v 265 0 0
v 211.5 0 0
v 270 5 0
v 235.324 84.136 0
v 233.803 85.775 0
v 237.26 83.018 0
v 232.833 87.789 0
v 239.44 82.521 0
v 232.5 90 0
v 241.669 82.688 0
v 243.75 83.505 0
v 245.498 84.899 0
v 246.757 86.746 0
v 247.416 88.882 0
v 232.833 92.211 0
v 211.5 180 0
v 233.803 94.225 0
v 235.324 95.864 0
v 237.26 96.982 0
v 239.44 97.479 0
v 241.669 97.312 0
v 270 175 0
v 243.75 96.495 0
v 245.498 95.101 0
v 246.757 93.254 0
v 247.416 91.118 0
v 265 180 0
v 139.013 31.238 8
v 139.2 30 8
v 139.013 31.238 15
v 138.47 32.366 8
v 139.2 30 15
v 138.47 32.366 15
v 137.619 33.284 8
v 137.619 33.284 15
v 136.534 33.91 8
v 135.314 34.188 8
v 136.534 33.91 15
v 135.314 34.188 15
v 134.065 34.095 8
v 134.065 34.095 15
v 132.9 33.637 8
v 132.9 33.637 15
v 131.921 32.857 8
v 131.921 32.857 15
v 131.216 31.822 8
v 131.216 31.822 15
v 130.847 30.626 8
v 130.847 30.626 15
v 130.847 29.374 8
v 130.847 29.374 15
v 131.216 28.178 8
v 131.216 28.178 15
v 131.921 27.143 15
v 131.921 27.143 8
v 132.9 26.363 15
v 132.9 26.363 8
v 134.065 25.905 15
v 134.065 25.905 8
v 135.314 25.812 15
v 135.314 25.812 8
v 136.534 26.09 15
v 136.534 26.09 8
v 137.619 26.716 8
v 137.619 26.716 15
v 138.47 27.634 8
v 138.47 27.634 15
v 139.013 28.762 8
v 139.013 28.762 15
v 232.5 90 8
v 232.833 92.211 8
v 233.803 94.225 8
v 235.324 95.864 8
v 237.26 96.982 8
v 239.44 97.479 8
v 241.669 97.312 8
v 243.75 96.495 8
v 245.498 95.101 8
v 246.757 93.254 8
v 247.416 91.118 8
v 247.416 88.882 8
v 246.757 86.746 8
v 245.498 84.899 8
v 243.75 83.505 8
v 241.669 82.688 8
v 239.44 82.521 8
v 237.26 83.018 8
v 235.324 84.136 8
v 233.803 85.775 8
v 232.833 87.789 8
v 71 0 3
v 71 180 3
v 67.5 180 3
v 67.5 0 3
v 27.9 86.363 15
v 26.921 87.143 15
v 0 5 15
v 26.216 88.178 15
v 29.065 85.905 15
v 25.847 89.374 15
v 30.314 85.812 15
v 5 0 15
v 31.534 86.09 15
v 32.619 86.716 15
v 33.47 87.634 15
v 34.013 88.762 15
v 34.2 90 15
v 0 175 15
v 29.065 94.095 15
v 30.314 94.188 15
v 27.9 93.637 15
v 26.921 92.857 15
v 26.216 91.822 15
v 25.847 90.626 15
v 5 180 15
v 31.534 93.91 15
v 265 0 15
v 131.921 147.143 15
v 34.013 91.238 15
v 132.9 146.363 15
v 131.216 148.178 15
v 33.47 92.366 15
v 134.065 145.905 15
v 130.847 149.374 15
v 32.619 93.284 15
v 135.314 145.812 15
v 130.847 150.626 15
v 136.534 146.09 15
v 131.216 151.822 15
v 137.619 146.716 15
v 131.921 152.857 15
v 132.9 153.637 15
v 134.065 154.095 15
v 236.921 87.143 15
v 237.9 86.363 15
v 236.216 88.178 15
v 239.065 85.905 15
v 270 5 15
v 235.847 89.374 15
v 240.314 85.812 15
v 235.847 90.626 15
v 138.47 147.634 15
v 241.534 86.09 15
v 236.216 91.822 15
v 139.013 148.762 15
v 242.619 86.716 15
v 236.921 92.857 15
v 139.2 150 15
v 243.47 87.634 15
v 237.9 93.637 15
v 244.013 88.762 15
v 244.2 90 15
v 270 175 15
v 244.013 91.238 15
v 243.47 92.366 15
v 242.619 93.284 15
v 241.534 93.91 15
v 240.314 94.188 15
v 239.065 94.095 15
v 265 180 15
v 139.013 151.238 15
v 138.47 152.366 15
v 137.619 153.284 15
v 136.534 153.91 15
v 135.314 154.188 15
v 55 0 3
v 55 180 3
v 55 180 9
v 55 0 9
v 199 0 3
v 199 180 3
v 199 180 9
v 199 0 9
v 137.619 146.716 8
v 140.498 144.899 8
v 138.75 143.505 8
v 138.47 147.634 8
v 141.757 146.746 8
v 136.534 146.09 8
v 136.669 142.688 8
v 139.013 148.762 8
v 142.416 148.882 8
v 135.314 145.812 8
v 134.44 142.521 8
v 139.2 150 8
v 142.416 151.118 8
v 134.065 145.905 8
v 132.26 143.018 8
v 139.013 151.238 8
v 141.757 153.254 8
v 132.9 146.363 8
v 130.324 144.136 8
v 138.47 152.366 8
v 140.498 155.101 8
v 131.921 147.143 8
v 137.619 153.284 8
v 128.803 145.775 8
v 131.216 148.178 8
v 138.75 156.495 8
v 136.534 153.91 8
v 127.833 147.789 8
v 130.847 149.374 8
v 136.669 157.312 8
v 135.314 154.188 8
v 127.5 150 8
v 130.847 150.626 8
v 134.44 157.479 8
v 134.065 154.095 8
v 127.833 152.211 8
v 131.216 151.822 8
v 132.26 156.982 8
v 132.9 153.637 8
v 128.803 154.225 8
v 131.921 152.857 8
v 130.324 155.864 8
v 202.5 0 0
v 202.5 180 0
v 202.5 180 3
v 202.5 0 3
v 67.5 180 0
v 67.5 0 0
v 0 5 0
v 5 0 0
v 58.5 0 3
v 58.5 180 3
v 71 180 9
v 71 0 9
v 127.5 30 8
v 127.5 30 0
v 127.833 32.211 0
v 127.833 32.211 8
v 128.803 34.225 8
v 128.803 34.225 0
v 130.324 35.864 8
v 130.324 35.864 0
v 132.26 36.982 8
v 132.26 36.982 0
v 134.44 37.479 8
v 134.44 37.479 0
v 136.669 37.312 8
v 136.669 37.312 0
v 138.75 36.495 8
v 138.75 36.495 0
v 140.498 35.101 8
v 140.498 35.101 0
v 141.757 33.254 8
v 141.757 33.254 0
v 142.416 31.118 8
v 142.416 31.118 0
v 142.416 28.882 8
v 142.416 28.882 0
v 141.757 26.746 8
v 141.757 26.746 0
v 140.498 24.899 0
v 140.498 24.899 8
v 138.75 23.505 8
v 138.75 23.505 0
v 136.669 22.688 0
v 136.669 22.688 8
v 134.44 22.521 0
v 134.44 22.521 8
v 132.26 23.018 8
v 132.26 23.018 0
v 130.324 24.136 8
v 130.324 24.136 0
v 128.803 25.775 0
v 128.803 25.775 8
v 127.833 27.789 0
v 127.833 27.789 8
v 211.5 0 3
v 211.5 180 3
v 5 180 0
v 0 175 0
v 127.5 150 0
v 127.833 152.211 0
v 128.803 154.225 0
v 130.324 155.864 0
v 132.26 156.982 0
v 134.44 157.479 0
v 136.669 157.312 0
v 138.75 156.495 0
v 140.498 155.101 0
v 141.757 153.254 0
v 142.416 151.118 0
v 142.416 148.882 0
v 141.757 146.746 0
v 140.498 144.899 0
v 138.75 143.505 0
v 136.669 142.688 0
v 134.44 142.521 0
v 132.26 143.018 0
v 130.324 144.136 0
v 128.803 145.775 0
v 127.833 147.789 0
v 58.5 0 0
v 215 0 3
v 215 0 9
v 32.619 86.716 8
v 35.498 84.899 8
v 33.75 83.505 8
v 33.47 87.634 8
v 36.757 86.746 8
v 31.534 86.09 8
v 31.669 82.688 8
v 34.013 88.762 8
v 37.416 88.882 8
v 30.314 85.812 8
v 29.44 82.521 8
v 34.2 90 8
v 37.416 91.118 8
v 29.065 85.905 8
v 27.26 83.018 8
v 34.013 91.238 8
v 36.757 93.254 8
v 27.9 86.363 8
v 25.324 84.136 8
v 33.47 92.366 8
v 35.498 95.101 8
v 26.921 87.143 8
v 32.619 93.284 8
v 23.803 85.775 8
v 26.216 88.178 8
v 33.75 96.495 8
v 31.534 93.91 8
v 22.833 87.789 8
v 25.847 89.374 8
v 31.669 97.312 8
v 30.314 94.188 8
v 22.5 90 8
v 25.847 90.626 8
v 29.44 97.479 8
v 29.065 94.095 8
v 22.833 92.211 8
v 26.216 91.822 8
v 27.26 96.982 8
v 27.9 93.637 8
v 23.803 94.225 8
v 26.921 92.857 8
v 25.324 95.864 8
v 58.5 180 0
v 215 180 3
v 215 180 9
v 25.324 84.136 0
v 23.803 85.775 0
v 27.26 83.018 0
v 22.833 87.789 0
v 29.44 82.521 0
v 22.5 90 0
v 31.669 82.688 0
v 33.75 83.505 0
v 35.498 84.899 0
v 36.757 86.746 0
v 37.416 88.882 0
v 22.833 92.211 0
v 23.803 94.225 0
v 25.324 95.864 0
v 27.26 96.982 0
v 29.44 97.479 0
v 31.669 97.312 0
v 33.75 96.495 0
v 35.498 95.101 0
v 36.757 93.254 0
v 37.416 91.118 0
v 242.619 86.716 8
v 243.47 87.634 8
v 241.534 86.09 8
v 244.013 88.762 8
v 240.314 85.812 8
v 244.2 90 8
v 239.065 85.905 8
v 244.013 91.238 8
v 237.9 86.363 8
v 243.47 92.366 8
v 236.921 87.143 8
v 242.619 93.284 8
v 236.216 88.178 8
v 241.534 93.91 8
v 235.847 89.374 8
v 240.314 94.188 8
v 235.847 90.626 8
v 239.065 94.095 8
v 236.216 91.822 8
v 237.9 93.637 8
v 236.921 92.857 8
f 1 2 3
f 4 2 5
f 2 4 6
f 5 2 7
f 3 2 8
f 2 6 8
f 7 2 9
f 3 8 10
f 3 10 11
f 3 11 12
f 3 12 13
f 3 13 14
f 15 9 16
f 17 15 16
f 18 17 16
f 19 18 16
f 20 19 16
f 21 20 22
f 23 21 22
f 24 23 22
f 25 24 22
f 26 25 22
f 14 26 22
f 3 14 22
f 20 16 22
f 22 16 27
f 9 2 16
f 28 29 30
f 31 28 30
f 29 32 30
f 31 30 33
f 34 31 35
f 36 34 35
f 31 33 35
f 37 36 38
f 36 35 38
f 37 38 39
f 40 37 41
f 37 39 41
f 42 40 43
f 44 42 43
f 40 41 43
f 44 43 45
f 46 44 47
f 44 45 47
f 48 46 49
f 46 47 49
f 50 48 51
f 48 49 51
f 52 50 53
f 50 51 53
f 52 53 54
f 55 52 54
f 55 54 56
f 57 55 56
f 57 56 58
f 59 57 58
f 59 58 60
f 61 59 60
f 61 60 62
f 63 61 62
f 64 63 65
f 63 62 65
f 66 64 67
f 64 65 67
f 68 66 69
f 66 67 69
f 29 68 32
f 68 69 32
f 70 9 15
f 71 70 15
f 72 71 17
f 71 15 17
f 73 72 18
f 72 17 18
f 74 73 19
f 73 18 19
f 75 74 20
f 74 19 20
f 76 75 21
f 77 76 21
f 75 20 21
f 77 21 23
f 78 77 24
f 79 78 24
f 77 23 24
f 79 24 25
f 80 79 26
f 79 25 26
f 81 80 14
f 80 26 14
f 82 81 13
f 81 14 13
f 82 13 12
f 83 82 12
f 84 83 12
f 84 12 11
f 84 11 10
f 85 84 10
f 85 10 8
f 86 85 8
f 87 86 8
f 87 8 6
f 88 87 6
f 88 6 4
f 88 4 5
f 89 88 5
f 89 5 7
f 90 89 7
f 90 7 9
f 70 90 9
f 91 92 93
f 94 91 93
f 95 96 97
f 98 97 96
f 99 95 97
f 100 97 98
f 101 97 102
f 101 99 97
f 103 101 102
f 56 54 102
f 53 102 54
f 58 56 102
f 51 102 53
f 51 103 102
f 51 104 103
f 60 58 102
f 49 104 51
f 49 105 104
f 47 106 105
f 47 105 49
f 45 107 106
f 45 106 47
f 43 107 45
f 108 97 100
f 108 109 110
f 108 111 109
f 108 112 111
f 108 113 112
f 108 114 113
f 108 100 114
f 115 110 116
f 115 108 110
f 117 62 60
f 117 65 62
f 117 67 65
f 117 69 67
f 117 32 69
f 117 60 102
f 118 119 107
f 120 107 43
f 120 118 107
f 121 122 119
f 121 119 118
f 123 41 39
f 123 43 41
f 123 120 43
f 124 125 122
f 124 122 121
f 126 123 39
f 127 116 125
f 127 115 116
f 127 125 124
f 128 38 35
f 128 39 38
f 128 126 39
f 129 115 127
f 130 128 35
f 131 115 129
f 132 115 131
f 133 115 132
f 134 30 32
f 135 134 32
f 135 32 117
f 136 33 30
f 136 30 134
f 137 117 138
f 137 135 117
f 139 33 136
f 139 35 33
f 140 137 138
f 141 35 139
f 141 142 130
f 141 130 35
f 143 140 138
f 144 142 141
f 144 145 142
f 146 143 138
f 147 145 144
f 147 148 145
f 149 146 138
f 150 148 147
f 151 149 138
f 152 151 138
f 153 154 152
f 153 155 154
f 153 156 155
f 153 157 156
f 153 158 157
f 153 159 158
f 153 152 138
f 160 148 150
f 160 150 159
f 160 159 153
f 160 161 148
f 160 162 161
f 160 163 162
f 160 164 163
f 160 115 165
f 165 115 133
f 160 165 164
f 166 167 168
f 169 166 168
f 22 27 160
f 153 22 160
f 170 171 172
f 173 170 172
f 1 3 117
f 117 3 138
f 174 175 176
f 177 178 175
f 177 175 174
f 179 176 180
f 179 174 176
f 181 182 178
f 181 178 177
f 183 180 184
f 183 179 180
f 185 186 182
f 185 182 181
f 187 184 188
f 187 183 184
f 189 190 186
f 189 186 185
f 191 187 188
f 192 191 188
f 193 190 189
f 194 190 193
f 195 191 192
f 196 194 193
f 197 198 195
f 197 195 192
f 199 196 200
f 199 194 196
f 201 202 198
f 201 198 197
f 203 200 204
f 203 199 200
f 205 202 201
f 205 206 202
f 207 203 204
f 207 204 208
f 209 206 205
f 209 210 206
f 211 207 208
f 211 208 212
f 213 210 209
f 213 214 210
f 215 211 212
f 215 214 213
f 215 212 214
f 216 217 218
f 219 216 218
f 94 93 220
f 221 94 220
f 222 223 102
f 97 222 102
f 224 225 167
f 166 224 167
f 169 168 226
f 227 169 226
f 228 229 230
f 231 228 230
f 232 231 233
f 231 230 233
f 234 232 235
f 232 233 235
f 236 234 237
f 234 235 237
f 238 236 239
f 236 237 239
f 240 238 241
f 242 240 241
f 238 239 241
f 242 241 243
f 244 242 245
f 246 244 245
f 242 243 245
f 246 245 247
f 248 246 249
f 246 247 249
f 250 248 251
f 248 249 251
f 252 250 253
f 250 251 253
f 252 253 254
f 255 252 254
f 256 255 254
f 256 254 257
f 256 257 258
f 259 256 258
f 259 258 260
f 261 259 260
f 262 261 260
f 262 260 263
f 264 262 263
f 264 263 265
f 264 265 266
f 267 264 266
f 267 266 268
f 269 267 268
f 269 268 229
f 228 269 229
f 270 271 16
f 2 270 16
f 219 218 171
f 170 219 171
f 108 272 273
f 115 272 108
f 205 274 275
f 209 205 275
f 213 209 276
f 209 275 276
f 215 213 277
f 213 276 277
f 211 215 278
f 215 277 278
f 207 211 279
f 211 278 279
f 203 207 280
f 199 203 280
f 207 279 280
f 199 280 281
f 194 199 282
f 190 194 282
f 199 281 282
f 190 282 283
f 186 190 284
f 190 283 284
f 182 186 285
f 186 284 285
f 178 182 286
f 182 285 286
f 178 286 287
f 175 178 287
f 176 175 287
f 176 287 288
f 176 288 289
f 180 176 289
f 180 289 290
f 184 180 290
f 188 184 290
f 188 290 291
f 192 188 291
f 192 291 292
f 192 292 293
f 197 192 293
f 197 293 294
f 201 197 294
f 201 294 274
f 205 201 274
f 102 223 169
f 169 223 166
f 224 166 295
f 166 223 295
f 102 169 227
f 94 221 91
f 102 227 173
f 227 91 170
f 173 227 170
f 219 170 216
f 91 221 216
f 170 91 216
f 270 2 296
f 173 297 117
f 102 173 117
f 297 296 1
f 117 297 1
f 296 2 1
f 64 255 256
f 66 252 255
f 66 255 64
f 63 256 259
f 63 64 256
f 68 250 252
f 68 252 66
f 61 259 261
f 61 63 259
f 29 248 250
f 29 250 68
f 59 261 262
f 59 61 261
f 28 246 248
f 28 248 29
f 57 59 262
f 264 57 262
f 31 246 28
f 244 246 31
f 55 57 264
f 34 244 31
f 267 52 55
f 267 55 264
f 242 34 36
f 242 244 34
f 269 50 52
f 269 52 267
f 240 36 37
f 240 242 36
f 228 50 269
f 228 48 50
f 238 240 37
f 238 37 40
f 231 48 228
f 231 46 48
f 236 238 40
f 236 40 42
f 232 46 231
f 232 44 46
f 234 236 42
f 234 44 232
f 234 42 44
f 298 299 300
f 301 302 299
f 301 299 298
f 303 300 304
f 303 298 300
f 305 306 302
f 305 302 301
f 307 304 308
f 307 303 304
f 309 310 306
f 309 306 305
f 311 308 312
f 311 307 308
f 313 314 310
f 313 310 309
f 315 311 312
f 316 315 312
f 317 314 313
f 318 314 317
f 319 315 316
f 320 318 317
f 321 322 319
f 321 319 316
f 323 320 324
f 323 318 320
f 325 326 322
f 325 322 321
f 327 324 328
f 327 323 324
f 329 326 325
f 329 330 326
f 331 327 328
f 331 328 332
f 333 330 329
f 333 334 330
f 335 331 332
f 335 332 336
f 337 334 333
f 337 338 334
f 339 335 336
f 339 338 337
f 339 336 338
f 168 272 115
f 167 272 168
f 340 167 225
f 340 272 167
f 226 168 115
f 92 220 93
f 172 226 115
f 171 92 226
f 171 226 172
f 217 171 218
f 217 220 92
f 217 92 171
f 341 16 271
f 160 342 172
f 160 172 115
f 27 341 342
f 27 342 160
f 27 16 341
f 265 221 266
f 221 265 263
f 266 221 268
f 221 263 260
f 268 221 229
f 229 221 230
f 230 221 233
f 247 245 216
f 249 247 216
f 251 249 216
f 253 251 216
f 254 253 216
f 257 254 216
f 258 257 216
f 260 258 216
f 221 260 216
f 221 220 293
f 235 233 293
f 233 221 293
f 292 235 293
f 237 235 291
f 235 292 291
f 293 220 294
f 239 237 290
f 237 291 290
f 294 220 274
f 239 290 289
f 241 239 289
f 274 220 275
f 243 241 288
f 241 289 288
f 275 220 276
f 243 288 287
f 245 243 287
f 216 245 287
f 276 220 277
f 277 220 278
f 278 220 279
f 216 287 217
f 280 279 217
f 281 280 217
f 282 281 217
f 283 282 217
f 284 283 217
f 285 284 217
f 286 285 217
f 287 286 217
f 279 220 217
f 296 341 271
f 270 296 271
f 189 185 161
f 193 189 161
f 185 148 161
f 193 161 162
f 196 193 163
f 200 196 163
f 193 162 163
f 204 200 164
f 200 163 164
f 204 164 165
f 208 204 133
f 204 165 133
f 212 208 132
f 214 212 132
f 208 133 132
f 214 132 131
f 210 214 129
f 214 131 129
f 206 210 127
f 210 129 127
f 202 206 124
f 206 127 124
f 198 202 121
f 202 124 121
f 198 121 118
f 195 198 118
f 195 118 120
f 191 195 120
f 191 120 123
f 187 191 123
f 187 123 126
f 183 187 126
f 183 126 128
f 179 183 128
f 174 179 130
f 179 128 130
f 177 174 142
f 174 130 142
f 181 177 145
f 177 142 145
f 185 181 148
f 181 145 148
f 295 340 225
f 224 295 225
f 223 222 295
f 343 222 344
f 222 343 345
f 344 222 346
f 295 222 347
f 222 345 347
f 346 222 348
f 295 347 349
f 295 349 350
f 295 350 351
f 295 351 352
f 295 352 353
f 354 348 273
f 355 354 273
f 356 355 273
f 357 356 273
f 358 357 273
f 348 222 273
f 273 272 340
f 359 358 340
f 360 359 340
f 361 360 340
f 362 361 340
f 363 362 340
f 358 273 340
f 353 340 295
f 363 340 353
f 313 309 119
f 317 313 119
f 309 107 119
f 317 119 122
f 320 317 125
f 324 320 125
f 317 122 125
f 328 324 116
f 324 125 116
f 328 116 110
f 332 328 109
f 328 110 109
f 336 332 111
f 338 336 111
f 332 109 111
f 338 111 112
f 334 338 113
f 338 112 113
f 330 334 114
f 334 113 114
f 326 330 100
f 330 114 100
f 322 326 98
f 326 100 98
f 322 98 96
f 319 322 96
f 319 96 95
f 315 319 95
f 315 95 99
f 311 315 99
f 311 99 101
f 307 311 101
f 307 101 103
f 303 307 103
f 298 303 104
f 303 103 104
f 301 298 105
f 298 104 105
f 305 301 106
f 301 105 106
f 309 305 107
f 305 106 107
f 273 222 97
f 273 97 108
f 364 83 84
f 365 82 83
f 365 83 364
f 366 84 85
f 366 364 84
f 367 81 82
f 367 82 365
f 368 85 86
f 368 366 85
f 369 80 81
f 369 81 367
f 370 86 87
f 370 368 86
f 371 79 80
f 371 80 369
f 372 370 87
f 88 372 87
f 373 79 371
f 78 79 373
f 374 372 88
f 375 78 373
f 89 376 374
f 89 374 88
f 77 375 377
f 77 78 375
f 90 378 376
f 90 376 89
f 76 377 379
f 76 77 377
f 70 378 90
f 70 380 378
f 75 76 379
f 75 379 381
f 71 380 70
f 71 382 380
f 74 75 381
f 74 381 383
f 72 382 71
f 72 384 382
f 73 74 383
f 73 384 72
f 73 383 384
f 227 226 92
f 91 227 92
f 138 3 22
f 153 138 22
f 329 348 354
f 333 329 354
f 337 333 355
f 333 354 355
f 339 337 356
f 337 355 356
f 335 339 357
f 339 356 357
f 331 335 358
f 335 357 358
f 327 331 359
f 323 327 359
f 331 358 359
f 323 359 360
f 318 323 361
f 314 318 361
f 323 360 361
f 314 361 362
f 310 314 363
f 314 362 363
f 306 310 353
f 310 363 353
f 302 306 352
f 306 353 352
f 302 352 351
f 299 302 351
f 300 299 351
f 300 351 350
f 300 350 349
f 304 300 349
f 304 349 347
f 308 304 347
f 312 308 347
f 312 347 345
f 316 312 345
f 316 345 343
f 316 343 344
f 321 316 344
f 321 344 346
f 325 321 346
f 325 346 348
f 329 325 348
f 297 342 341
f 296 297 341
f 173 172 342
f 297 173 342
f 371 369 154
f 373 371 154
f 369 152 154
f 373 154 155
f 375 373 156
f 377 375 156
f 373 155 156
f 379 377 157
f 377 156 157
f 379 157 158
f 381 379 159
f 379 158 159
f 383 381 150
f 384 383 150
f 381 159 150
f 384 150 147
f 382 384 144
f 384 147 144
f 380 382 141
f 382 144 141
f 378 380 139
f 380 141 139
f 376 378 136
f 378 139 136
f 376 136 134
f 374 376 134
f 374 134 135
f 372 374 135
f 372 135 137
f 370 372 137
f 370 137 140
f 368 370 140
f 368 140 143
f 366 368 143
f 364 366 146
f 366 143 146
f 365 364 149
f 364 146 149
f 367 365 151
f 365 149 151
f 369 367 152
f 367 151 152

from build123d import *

# Parameters (mm, degrees)
SKETCH_1_W                   = 270
SKETCH_1_H                   = 180
EXTRUDE_1_DEPTH              = 15
CHAMFER_1_SIZE               = 5
HOLE_WIZARD_M8_1_D           = 8.4
HOLE_WIZARD_M8_1_CBORE_D     = 15
HOLE_WIZARD_M8_1_CBORE_DEPTH = 8
CUT_EXTRUDE_1_DEPTH          = 325.846117416


with BuildPart() as part:
    # 草图1 → 凸台-拉伸1 (new body)
    with BuildSketch(Plane.XY):
        with Locations((135, 90)):
            Rectangle(SKETCH_1_W, SKETCH_1_H)
    extrude(amount=EXTRUDE_1_DEPTH)

    # 倒角1
    chamfer_1_edges = [part.edges().sort_by_distance(p)[0] for p in [
        (0, 180, 7.5),
        (270, 180, 7.5),
        (270, 0, 7.5),
        (0, 0, 7.5),
    ]]
    chamfer(chamfer_1_edges, length=CHAMFER_1_SIZE)

    # M8 凹头盖螺钉的柱形沉头孔1 (through all)
    with Locations(Plane(origin=(0, 0, 0), x_dir=(-1, 0, 0), z_dir=(0, 0, -1))):
        with Locations((-240, 90), (-30, 90), (-135, 30), (-135, 150)):
            CounterBoreHole(HOLE_WIZARD_M8_1_D / 2, HOLE_WIZARD_M8_1_CBORE_D / 2, HOLE_WIZARD_M8_1_CBORE_DEPTH)

    # 草图4 → 切除-拉伸1 (cut, through all)
    with BuildSketch(Plane(origin=(0, 180, 0), x_dir=(1, 0, 0), z_dir=(0, 1, 0))):
        Polygon((55, -9), (71, -9), (71, -3), (67.5, -3), (67.5, 0), (58.5, 0), (58.5, -3), (55, -3), align=None)
        Polygon((202.5, -3), (199, -3), (199, -9), (215, -9), (215, -3), (211.5, -3), (211.5, 0), (202.5, 0), align=None)
    extrude(amount=-CUT_EXTRUDE_1_DEPTH, mode=Mode.SUBTRACT)


solid = part.part
